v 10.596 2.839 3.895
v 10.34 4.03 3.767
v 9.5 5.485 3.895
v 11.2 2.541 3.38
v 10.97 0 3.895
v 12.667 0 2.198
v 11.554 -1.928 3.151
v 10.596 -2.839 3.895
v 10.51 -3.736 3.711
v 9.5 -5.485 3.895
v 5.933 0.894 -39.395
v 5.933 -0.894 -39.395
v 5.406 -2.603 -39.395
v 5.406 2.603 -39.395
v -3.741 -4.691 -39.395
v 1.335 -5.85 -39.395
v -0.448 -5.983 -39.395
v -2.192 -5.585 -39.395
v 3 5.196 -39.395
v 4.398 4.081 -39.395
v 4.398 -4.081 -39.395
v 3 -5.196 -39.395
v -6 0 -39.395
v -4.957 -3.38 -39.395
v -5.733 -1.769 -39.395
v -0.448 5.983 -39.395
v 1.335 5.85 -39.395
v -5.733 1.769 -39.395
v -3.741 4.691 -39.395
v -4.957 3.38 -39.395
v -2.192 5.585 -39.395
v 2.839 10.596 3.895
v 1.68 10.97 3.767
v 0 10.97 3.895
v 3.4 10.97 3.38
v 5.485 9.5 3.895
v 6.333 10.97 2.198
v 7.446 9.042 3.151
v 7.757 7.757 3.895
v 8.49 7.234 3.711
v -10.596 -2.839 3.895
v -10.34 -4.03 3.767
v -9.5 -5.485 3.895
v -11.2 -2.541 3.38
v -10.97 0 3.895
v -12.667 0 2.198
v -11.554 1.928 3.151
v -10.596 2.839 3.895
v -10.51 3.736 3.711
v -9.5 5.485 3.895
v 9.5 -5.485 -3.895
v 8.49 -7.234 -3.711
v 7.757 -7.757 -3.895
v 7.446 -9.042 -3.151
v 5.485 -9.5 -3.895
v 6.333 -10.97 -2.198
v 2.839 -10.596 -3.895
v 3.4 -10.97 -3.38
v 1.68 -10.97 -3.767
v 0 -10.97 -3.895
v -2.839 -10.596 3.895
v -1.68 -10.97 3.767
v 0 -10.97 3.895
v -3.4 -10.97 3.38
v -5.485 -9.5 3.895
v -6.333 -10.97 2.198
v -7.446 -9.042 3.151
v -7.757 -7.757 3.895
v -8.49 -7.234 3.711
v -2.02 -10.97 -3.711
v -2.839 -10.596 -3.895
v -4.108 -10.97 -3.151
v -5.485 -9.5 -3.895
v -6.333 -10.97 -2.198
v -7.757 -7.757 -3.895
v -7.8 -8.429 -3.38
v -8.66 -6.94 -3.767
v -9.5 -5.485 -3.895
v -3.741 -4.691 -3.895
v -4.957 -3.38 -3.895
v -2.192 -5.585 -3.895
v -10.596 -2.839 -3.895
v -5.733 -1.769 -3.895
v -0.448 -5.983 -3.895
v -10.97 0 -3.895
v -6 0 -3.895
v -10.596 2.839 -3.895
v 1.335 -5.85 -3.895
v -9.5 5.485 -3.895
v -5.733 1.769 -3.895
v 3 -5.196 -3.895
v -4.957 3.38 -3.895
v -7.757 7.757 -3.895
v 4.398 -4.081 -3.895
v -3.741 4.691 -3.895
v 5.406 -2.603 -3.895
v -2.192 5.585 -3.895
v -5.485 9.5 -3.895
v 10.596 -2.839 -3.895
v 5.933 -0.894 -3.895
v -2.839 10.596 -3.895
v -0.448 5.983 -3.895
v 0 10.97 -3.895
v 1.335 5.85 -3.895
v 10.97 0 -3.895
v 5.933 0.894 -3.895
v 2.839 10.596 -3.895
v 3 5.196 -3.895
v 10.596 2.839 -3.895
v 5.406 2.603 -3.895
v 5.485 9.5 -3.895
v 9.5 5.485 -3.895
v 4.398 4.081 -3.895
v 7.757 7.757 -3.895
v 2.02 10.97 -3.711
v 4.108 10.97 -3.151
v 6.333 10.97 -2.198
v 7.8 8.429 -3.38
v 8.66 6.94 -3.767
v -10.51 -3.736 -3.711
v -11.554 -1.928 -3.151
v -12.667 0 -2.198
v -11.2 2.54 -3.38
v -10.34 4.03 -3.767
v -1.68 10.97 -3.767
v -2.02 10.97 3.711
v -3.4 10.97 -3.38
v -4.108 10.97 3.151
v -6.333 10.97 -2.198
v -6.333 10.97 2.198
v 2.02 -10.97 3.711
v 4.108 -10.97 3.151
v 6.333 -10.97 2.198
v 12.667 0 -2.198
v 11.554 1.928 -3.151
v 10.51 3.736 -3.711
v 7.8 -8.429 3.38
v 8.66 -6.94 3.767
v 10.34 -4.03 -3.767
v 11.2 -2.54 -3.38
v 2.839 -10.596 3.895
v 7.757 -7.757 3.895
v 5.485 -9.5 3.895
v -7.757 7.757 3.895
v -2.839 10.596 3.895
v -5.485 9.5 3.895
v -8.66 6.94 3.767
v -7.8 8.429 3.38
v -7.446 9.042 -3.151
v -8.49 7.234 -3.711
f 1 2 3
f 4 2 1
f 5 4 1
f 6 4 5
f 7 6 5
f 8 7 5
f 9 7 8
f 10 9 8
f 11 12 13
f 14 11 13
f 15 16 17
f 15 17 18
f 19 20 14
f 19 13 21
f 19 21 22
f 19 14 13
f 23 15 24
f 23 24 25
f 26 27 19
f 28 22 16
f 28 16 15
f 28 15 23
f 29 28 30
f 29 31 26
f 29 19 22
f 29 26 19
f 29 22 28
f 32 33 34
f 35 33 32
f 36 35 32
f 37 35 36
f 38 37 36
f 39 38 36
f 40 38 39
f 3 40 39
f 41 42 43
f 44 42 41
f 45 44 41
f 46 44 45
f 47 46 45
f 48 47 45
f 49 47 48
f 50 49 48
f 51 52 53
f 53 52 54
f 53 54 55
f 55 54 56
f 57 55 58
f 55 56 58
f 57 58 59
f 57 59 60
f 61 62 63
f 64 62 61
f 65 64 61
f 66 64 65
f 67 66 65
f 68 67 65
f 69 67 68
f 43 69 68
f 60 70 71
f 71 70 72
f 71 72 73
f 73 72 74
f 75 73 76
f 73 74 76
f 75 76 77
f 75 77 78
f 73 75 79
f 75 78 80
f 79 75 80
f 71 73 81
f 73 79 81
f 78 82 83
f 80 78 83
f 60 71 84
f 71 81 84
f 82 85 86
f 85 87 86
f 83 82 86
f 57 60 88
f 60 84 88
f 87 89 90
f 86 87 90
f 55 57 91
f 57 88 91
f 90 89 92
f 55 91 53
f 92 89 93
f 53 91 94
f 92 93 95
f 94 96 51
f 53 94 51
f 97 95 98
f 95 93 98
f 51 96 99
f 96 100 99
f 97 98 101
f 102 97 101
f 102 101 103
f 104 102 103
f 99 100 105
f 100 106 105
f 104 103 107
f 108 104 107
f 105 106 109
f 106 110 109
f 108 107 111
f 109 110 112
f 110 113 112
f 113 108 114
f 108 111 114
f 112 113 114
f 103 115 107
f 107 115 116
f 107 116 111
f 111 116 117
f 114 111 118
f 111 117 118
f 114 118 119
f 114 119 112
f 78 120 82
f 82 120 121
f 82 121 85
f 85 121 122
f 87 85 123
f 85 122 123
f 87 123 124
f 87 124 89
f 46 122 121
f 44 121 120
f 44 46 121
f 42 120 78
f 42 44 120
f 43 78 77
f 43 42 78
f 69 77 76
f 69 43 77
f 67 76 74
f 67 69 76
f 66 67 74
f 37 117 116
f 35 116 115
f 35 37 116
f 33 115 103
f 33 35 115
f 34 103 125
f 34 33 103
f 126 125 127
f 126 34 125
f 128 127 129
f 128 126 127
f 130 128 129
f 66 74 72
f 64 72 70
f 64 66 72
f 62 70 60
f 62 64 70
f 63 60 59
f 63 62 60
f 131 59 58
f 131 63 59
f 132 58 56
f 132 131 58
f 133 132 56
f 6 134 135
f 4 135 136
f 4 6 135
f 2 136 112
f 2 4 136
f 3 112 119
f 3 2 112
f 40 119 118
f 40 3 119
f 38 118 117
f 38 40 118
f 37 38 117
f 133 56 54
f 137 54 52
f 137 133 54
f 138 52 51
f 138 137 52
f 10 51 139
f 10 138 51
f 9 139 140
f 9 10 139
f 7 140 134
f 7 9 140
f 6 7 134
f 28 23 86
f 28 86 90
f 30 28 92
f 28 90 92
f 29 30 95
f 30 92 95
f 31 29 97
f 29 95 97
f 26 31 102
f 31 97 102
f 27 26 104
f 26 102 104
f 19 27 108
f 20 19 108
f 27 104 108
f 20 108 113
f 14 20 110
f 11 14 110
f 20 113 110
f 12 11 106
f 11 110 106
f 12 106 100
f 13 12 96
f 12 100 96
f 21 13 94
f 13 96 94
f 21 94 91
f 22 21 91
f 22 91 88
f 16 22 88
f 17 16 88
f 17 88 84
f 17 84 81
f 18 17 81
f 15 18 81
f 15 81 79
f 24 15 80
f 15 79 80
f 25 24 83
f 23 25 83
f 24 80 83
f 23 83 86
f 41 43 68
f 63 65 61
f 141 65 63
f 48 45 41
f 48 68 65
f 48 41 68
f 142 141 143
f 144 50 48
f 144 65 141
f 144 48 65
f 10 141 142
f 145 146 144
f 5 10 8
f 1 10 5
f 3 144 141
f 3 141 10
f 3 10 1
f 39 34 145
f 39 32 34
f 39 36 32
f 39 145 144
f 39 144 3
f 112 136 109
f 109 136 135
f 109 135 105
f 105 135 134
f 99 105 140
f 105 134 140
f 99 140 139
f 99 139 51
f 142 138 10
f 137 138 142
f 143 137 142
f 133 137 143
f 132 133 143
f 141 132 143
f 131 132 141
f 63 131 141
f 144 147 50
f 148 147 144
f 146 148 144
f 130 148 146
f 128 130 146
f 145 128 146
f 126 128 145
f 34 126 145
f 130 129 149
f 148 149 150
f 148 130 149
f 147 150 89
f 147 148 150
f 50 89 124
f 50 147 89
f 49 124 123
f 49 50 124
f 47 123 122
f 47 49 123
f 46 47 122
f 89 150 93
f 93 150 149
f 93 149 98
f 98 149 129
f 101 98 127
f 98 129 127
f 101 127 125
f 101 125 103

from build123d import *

# Parameters (mm, degrees)
BOSS_EXTRUDE1_DEPTH = 3.895
SKETCH2_OUTSIDE_W   = 51.796
SKETCH2_OUTSIDE_H   = 48.402
SKETCH2_OUTSIDE_R   = 10.969655115
CUT_EXTRUDE1_DEPTH  = 8.79
CUT_EXTRUDE1_TAPER  = 45
SKETCH3_R           = 6
BOSS_EXTRUDE2_DEPTH = 35.5


with BuildPart() as part:
    # Sketch1 → Boss-Extrude1 (new body, symmetric)
    with BuildSketch(Plane.XY):
        Polygon((-6.333333333, 10.969655115), (-12.666666667, 0), (-6.333333333, -10.969655115), (6.333333333, -10.969655115), (12.666666667, 0), (6.333333333, 10.969655115), align=None)
    extrude(amount=BOSS_EXTRUDE1_DEPTH, both=True)

    # Sketch2 outside → Cut-Extrude1 (cut, through all)
    with BuildSketch(Plane.XY.offset(3.895)):
        Rectangle(SKETCH2_OUTSIDE_W, SKETCH2_OUTSIDE_H)
        Circle(SKETCH2_OUTSIDE_R, mode=Mode.SUBTRACT)
    cut_extrude1 = extrude(amount=-CUT_EXTRUDE1_DEPTH, taper=CUT_EXTRUDE1_TAPER, mode=Mode.SUBTRACT)

    # Mirror1: Cut-Extrude1 across plane
    add(cut_extrude1.mirror(Plane.XY), mode=Mode.SUBTRACT)

    # Sketch3 → Boss-Extrude2 (add)
    with BuildSketch(Plane(origin=(0, 0, -3.895), x_dir=(-1, 0, 0), z_dir=(0, 0, -1))):
        Circle(SKETCH3_R)
    extrude(amount=BOSS_EXTRUDE2_DEPTH)


solid = part.part
